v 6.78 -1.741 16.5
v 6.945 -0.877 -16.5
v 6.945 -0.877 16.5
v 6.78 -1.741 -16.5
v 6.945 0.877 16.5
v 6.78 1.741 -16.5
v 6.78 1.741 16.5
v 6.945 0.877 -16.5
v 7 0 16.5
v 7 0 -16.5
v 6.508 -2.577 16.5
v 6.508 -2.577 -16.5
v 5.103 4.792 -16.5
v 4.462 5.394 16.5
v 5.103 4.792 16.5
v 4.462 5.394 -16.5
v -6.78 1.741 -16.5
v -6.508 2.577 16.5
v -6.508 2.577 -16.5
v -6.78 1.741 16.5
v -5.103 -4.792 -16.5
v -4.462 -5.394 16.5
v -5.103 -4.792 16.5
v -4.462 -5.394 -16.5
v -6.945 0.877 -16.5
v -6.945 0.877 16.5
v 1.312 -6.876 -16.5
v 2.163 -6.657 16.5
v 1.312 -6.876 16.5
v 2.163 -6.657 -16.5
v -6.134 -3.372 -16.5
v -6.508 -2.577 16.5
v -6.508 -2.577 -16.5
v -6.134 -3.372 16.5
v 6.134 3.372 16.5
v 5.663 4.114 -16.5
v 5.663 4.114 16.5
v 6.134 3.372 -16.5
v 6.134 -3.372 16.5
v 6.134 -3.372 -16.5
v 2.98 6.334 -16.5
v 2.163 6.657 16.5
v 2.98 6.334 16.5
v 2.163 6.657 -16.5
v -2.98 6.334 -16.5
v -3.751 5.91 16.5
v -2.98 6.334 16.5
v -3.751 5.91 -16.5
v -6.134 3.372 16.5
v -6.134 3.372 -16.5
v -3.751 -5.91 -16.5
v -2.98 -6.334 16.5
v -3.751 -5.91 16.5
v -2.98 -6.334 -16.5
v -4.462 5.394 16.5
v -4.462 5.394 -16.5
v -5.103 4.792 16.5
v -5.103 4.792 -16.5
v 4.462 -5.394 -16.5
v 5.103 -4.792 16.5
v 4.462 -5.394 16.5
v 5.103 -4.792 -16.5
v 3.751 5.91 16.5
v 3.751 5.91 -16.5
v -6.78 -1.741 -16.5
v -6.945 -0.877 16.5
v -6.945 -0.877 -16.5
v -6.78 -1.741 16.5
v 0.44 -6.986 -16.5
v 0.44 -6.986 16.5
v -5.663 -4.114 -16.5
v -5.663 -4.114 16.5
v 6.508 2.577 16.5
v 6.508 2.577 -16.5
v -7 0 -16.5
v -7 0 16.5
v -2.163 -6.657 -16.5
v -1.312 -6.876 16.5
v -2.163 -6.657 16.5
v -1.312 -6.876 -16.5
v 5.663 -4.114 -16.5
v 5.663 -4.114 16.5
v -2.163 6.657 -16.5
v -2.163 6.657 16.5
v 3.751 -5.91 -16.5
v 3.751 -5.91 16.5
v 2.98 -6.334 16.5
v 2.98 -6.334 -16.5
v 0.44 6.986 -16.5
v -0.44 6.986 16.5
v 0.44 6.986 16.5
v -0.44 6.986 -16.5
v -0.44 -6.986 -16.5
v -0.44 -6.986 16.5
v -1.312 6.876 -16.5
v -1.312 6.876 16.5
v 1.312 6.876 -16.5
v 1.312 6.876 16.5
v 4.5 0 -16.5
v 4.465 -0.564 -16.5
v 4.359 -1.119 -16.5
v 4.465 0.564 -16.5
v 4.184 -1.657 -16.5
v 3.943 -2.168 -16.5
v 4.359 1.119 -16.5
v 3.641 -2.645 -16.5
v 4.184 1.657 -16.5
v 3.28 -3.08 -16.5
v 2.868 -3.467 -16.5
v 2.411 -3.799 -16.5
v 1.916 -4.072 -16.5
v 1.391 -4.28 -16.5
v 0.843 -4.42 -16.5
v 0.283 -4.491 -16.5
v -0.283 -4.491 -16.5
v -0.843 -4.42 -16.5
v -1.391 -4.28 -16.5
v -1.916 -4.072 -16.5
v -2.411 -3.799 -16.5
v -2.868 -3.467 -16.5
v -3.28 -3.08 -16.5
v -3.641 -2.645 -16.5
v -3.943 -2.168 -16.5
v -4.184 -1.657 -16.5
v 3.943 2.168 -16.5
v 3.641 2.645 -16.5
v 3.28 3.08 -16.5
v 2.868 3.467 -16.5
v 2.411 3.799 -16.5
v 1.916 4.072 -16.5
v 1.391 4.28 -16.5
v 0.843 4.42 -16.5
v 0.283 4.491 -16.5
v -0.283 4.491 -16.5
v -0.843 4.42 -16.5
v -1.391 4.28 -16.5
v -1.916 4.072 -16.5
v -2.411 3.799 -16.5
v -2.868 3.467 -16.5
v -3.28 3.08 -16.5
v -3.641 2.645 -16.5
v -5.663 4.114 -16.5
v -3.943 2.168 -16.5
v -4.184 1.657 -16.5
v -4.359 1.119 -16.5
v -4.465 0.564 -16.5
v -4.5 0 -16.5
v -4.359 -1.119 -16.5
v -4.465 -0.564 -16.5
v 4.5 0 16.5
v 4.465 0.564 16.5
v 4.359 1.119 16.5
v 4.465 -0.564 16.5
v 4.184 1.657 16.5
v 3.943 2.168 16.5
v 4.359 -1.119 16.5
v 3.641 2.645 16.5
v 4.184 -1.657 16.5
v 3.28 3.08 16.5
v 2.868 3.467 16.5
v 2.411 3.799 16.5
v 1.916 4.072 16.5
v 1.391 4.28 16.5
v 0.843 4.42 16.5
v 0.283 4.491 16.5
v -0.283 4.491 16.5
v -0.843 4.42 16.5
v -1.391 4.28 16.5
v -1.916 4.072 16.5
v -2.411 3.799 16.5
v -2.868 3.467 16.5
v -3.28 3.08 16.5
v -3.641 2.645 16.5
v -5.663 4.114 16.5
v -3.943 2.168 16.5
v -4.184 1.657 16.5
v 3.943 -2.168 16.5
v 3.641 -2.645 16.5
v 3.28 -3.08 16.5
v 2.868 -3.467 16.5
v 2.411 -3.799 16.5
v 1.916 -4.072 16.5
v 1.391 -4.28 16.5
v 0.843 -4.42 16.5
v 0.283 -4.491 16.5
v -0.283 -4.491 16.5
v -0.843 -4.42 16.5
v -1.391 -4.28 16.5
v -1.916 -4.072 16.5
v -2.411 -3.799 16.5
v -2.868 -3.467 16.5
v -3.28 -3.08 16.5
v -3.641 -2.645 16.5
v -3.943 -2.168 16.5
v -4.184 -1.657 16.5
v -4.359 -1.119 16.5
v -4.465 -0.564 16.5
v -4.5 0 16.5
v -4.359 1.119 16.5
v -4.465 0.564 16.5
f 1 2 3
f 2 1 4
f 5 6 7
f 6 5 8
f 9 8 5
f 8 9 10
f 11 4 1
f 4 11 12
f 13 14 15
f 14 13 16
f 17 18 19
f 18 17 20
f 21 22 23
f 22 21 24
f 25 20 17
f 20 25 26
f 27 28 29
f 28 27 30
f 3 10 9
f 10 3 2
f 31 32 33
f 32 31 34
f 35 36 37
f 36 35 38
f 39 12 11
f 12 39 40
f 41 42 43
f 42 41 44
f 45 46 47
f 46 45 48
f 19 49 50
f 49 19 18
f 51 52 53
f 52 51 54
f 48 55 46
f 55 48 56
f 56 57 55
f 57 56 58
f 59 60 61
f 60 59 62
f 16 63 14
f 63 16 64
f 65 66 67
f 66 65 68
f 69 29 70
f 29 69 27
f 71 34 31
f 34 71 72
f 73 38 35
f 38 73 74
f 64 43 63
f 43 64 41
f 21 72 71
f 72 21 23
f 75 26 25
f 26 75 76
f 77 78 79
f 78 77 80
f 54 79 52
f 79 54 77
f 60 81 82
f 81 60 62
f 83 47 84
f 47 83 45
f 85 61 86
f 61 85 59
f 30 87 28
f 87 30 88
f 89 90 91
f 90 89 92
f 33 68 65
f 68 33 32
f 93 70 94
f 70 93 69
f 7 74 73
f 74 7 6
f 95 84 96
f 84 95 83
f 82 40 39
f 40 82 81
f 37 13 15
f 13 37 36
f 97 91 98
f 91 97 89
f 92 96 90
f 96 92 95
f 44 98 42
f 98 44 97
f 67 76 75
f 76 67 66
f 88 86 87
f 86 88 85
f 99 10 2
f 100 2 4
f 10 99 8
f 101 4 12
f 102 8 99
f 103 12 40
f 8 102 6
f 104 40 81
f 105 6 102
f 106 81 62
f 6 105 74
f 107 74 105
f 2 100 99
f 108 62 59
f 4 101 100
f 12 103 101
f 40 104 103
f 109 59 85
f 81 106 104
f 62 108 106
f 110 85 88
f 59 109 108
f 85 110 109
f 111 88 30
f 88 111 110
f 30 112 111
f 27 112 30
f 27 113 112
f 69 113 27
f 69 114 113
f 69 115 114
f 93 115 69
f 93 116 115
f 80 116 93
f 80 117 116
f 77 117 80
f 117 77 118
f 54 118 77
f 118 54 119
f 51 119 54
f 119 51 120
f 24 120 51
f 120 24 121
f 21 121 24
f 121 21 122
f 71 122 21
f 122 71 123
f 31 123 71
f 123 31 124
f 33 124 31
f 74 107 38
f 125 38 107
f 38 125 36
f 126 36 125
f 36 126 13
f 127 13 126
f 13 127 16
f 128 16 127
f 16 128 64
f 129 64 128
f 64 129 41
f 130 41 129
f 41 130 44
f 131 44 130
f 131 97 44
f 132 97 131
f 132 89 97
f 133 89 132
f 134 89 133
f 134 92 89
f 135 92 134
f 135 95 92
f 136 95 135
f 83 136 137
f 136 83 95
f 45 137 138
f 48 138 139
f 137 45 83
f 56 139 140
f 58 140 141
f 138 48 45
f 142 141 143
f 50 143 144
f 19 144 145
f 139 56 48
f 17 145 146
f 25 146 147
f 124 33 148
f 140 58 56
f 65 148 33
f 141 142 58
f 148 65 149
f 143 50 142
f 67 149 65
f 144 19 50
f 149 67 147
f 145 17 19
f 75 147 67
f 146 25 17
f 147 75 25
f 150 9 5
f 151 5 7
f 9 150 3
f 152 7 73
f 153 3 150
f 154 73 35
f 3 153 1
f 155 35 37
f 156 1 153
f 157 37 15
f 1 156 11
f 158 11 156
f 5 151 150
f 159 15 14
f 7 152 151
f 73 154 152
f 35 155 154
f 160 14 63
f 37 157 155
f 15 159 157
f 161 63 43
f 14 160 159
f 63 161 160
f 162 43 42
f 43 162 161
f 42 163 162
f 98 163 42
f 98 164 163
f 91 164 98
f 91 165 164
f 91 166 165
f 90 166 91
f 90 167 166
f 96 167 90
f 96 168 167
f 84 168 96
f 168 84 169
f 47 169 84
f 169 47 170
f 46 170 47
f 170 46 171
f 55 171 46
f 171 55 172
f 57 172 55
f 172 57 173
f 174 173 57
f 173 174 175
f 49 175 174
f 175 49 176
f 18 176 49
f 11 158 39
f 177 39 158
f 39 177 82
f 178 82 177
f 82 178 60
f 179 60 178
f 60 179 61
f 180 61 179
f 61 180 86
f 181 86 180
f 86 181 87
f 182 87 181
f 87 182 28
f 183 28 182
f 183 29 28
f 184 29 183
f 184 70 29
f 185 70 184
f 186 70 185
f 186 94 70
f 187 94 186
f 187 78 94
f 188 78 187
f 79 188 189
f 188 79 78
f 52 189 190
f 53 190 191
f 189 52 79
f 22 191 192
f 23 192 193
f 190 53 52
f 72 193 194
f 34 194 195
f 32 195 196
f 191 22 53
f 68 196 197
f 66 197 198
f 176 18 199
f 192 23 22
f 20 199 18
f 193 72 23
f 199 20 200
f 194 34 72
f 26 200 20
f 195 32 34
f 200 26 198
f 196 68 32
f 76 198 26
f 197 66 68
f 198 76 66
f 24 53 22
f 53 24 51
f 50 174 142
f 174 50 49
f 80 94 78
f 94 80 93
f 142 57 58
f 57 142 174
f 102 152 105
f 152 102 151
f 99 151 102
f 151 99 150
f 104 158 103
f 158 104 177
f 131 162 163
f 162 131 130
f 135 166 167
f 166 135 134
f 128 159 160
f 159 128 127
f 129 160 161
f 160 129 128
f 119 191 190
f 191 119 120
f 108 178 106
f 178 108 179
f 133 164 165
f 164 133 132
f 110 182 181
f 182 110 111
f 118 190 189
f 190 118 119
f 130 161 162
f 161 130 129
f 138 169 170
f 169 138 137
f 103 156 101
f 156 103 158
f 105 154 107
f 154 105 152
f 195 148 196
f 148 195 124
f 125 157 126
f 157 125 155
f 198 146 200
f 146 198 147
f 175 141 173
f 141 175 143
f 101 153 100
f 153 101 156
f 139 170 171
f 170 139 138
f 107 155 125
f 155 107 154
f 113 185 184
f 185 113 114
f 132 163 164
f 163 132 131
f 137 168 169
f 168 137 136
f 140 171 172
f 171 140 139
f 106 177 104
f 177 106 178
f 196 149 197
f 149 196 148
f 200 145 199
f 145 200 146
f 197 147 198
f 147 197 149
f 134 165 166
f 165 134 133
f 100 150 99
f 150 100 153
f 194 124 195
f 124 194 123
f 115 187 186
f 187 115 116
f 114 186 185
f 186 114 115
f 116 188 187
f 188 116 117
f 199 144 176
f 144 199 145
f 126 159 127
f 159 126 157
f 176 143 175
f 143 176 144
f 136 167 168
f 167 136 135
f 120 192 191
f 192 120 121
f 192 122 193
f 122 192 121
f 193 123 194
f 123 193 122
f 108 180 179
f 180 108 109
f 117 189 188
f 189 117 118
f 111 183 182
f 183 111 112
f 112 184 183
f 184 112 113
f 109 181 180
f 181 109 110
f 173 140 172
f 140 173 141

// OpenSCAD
$fn = 50;


difference() {
	union() {
		translate(v = [0, 0, -16.5000000000]) {
			cylinder(h = 33, r = 7.0000000000);
		}
	}
	union() {
		translate(v = [0, 0, -100.0000000000]) {
			cylinder(h = 200, r = 4.5000000000);
		}
	}
}
